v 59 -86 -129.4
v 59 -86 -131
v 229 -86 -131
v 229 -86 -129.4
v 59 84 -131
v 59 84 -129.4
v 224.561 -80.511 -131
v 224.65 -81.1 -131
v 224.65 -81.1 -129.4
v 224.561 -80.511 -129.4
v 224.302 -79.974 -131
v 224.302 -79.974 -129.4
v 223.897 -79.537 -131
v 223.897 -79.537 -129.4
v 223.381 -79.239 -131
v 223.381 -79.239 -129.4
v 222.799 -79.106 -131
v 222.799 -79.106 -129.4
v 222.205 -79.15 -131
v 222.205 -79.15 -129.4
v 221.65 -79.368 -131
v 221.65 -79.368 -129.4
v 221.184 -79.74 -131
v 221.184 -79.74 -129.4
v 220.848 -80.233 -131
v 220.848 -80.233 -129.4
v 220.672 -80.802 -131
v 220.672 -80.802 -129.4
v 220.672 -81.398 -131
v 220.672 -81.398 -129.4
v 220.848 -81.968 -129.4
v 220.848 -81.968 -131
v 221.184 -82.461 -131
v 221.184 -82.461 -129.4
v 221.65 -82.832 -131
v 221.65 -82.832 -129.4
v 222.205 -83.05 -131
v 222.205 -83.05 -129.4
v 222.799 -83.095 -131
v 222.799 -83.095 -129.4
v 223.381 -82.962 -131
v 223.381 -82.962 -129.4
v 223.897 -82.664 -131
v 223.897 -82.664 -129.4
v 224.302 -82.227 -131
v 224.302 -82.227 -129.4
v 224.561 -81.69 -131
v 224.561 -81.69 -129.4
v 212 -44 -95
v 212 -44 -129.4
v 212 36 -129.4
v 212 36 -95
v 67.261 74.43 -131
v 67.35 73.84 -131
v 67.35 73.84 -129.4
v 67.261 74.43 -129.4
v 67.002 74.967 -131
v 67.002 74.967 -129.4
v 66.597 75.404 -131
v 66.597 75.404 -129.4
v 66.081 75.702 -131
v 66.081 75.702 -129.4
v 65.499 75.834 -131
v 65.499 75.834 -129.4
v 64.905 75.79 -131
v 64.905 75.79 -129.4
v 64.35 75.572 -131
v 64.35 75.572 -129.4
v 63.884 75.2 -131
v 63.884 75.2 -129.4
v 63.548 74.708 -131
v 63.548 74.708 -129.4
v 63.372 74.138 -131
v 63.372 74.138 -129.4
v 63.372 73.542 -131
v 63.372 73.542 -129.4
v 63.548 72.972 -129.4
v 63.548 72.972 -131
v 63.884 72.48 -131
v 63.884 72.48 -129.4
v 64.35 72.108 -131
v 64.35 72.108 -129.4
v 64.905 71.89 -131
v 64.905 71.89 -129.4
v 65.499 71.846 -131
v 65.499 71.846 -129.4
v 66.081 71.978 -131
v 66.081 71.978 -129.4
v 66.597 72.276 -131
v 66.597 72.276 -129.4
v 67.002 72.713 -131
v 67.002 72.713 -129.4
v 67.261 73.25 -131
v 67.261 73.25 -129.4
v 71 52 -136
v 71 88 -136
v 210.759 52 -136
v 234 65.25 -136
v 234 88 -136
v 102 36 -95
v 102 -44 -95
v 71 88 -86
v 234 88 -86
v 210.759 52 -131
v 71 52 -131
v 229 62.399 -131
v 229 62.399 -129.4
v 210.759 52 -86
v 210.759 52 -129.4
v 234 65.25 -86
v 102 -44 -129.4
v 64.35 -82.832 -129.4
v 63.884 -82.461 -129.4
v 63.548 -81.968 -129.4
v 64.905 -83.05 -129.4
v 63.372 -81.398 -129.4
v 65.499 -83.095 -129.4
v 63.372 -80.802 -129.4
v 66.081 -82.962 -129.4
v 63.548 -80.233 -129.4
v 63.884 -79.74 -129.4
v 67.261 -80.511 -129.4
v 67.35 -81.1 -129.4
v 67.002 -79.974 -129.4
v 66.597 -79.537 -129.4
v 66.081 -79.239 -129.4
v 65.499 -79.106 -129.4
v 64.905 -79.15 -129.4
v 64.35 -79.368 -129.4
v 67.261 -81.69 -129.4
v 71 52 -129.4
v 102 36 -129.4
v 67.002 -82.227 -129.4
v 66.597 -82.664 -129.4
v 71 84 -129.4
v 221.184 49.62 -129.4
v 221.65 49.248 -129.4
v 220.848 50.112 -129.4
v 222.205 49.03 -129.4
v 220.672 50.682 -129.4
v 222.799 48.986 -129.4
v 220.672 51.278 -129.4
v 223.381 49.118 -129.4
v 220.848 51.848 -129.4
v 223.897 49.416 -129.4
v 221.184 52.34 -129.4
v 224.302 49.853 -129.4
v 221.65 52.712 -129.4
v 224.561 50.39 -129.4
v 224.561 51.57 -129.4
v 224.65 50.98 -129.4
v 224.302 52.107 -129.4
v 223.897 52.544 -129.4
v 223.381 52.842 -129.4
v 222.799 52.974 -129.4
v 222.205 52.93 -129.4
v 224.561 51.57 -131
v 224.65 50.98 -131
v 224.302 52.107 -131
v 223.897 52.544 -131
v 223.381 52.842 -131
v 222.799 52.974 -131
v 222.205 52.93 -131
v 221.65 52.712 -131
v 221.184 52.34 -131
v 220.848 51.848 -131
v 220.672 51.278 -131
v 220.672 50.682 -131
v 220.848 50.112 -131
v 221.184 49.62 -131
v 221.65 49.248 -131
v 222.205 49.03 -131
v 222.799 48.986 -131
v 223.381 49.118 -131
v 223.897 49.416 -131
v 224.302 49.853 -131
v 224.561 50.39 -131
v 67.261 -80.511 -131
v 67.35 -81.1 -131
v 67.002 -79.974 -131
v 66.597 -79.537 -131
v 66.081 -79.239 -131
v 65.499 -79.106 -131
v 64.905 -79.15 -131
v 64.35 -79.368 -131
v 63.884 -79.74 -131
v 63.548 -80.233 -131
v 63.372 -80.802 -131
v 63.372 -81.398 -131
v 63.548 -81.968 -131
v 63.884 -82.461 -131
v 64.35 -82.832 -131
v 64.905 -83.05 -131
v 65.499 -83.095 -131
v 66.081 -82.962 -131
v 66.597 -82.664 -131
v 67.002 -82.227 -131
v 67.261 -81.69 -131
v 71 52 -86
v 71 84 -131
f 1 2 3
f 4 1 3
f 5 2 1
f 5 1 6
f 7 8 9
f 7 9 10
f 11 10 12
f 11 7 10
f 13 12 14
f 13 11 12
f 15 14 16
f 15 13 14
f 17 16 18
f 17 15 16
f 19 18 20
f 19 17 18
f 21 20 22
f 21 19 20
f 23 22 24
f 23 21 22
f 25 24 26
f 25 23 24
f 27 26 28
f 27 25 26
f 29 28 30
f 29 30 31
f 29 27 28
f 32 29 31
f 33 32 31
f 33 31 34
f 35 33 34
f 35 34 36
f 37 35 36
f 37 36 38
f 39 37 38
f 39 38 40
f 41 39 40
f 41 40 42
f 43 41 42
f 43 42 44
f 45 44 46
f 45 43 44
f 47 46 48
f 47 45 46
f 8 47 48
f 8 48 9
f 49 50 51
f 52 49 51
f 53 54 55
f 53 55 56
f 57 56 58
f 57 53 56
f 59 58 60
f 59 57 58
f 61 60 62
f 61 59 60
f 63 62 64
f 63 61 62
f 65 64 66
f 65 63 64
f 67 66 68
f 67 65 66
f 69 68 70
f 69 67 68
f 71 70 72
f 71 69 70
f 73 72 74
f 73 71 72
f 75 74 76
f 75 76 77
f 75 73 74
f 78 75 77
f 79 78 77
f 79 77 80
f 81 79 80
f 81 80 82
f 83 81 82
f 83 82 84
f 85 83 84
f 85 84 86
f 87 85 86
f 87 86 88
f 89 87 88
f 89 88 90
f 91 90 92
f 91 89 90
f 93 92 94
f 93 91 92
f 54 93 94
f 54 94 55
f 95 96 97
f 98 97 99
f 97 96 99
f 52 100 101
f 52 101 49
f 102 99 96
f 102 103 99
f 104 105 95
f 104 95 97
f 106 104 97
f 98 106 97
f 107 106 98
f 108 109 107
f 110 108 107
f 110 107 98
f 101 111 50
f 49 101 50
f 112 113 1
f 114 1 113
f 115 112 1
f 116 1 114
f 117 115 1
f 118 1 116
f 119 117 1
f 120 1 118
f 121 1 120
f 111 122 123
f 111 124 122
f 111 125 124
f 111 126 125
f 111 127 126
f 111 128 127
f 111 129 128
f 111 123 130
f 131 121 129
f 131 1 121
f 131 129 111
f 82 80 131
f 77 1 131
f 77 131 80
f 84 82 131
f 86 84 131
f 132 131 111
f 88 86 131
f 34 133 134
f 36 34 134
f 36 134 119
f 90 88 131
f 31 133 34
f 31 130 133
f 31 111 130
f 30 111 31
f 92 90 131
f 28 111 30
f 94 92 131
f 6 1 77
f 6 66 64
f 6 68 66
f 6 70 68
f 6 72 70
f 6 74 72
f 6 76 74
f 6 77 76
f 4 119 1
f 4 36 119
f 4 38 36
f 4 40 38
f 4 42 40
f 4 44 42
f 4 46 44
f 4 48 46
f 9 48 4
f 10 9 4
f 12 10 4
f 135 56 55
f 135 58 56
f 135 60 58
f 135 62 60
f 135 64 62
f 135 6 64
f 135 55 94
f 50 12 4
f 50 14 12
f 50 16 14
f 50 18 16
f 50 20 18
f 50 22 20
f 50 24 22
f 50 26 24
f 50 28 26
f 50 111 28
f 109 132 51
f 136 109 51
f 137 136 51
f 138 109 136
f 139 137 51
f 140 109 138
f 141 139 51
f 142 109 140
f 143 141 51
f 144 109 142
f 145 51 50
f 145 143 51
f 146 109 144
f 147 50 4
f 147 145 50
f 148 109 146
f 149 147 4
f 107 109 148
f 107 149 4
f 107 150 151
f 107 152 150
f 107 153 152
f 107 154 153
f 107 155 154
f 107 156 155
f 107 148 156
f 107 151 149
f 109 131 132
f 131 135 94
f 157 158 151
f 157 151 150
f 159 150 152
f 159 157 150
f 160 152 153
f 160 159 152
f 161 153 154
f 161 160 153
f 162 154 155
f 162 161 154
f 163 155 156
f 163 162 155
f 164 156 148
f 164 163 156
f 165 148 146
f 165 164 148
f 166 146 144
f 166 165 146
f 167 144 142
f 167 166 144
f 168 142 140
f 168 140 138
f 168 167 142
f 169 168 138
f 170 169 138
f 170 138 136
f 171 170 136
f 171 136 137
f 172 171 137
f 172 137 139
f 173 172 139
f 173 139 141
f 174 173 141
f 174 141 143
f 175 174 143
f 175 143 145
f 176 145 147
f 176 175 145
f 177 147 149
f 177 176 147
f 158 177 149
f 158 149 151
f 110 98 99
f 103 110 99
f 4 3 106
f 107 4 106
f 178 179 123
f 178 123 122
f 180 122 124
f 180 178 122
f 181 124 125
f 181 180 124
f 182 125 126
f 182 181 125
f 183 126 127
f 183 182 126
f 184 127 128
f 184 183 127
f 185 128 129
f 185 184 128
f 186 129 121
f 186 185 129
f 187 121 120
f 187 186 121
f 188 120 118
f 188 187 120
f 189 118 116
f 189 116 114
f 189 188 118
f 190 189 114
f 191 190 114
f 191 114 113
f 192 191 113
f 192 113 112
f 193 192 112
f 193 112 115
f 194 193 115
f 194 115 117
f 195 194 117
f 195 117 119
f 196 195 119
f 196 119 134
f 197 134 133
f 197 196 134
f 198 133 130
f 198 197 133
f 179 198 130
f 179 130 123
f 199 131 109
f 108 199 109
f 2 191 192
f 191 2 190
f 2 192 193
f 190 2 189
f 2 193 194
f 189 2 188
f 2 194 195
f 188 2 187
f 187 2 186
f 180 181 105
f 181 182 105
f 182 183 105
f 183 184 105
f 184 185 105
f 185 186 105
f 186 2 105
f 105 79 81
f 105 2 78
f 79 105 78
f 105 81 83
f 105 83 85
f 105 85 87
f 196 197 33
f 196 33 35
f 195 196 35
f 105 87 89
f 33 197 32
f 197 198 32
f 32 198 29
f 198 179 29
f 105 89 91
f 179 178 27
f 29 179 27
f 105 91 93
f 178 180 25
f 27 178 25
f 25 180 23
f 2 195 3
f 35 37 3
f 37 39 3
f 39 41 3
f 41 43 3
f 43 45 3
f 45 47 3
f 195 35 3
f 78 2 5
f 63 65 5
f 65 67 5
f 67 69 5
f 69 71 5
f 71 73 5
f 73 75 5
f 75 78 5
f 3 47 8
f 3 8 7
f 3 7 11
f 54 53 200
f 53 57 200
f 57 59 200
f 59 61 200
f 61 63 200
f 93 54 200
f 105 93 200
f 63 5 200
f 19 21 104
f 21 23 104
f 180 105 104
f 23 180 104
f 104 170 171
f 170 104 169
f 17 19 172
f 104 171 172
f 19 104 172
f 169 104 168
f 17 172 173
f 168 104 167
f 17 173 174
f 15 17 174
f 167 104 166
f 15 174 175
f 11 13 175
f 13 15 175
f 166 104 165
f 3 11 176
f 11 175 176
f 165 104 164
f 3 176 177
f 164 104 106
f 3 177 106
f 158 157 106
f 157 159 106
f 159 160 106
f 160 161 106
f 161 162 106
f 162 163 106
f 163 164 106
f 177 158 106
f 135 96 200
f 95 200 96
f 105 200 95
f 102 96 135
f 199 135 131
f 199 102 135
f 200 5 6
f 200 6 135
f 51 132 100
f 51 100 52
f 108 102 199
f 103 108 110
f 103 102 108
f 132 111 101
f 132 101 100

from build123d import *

# Parameters (mm, degrees)
SKETCH004_W  = 170
SKETCH004_H  = 170
SKETCH004_R  = 2
PAD004_DEPTH = 1.6
PAD007_DEPTH = 45
SKETCH042_W  = 110
SKETCH042_H  = 80
PAD022_DEPTH = 36
PAD029_DEPTH = 5


with BuildPart() as part:
    # Sketch004 → Pad004 (new body)
    with BuildSketch(Plane.XY):
        with Locations((85, 85)):
            Rectangle(SKETCH004_W, SKETCH004_H)
        with Locations((6.35, 4.8997)):
            Circle(SKETCH004_R, mode=Mode.SUBTRACT)
        with Locations((163.65, 4.8997)):
            Circle(SKETCH004_R, mode=Mode.SUBTRACT)
        with Locations((6.35, 159.84)):
            Circle(SKETCH004_R, mode=Mode.SUBTRACT)
        with Locations((163.65, 136.98)):
            Circle(SKETCH004_R, mode=Mode.SUBTRACT)
    extrude(amount=PAD004_DEPTH)

    # Sketch010 → Pad007 (join)
    with BuildSketch(Plane.XY):
        Polygon((12, 174), (12, 138), (151.758911, 138), (175, 151.249695), (175, 174), align=None)
    extrude(amount=PAD007_DEPTH)

    # Sketch042 → Pad022 (join)
    with BuildSketch(Plane.XY):
        with Locations((98, 82)):
            Rectangle(SKETCH042_W, SKETCH042_H)
    extrude(amount=PAD022_DEPTH)

    # Sketch010 → Pad029 (join)
    with BuildSketch(Plane.XY):
        Polygon((12, 174), (12, 138), (151.758911, 138), (175, 151.249695), (175, 174), align=None)
    extrude(amount=-PAD029_DEPTH)


with BuildPart() as part_1:
    # Body002 placement: moved
    add(part.part.moved(Location((59, -86, -131))))


solid = part_1.part
